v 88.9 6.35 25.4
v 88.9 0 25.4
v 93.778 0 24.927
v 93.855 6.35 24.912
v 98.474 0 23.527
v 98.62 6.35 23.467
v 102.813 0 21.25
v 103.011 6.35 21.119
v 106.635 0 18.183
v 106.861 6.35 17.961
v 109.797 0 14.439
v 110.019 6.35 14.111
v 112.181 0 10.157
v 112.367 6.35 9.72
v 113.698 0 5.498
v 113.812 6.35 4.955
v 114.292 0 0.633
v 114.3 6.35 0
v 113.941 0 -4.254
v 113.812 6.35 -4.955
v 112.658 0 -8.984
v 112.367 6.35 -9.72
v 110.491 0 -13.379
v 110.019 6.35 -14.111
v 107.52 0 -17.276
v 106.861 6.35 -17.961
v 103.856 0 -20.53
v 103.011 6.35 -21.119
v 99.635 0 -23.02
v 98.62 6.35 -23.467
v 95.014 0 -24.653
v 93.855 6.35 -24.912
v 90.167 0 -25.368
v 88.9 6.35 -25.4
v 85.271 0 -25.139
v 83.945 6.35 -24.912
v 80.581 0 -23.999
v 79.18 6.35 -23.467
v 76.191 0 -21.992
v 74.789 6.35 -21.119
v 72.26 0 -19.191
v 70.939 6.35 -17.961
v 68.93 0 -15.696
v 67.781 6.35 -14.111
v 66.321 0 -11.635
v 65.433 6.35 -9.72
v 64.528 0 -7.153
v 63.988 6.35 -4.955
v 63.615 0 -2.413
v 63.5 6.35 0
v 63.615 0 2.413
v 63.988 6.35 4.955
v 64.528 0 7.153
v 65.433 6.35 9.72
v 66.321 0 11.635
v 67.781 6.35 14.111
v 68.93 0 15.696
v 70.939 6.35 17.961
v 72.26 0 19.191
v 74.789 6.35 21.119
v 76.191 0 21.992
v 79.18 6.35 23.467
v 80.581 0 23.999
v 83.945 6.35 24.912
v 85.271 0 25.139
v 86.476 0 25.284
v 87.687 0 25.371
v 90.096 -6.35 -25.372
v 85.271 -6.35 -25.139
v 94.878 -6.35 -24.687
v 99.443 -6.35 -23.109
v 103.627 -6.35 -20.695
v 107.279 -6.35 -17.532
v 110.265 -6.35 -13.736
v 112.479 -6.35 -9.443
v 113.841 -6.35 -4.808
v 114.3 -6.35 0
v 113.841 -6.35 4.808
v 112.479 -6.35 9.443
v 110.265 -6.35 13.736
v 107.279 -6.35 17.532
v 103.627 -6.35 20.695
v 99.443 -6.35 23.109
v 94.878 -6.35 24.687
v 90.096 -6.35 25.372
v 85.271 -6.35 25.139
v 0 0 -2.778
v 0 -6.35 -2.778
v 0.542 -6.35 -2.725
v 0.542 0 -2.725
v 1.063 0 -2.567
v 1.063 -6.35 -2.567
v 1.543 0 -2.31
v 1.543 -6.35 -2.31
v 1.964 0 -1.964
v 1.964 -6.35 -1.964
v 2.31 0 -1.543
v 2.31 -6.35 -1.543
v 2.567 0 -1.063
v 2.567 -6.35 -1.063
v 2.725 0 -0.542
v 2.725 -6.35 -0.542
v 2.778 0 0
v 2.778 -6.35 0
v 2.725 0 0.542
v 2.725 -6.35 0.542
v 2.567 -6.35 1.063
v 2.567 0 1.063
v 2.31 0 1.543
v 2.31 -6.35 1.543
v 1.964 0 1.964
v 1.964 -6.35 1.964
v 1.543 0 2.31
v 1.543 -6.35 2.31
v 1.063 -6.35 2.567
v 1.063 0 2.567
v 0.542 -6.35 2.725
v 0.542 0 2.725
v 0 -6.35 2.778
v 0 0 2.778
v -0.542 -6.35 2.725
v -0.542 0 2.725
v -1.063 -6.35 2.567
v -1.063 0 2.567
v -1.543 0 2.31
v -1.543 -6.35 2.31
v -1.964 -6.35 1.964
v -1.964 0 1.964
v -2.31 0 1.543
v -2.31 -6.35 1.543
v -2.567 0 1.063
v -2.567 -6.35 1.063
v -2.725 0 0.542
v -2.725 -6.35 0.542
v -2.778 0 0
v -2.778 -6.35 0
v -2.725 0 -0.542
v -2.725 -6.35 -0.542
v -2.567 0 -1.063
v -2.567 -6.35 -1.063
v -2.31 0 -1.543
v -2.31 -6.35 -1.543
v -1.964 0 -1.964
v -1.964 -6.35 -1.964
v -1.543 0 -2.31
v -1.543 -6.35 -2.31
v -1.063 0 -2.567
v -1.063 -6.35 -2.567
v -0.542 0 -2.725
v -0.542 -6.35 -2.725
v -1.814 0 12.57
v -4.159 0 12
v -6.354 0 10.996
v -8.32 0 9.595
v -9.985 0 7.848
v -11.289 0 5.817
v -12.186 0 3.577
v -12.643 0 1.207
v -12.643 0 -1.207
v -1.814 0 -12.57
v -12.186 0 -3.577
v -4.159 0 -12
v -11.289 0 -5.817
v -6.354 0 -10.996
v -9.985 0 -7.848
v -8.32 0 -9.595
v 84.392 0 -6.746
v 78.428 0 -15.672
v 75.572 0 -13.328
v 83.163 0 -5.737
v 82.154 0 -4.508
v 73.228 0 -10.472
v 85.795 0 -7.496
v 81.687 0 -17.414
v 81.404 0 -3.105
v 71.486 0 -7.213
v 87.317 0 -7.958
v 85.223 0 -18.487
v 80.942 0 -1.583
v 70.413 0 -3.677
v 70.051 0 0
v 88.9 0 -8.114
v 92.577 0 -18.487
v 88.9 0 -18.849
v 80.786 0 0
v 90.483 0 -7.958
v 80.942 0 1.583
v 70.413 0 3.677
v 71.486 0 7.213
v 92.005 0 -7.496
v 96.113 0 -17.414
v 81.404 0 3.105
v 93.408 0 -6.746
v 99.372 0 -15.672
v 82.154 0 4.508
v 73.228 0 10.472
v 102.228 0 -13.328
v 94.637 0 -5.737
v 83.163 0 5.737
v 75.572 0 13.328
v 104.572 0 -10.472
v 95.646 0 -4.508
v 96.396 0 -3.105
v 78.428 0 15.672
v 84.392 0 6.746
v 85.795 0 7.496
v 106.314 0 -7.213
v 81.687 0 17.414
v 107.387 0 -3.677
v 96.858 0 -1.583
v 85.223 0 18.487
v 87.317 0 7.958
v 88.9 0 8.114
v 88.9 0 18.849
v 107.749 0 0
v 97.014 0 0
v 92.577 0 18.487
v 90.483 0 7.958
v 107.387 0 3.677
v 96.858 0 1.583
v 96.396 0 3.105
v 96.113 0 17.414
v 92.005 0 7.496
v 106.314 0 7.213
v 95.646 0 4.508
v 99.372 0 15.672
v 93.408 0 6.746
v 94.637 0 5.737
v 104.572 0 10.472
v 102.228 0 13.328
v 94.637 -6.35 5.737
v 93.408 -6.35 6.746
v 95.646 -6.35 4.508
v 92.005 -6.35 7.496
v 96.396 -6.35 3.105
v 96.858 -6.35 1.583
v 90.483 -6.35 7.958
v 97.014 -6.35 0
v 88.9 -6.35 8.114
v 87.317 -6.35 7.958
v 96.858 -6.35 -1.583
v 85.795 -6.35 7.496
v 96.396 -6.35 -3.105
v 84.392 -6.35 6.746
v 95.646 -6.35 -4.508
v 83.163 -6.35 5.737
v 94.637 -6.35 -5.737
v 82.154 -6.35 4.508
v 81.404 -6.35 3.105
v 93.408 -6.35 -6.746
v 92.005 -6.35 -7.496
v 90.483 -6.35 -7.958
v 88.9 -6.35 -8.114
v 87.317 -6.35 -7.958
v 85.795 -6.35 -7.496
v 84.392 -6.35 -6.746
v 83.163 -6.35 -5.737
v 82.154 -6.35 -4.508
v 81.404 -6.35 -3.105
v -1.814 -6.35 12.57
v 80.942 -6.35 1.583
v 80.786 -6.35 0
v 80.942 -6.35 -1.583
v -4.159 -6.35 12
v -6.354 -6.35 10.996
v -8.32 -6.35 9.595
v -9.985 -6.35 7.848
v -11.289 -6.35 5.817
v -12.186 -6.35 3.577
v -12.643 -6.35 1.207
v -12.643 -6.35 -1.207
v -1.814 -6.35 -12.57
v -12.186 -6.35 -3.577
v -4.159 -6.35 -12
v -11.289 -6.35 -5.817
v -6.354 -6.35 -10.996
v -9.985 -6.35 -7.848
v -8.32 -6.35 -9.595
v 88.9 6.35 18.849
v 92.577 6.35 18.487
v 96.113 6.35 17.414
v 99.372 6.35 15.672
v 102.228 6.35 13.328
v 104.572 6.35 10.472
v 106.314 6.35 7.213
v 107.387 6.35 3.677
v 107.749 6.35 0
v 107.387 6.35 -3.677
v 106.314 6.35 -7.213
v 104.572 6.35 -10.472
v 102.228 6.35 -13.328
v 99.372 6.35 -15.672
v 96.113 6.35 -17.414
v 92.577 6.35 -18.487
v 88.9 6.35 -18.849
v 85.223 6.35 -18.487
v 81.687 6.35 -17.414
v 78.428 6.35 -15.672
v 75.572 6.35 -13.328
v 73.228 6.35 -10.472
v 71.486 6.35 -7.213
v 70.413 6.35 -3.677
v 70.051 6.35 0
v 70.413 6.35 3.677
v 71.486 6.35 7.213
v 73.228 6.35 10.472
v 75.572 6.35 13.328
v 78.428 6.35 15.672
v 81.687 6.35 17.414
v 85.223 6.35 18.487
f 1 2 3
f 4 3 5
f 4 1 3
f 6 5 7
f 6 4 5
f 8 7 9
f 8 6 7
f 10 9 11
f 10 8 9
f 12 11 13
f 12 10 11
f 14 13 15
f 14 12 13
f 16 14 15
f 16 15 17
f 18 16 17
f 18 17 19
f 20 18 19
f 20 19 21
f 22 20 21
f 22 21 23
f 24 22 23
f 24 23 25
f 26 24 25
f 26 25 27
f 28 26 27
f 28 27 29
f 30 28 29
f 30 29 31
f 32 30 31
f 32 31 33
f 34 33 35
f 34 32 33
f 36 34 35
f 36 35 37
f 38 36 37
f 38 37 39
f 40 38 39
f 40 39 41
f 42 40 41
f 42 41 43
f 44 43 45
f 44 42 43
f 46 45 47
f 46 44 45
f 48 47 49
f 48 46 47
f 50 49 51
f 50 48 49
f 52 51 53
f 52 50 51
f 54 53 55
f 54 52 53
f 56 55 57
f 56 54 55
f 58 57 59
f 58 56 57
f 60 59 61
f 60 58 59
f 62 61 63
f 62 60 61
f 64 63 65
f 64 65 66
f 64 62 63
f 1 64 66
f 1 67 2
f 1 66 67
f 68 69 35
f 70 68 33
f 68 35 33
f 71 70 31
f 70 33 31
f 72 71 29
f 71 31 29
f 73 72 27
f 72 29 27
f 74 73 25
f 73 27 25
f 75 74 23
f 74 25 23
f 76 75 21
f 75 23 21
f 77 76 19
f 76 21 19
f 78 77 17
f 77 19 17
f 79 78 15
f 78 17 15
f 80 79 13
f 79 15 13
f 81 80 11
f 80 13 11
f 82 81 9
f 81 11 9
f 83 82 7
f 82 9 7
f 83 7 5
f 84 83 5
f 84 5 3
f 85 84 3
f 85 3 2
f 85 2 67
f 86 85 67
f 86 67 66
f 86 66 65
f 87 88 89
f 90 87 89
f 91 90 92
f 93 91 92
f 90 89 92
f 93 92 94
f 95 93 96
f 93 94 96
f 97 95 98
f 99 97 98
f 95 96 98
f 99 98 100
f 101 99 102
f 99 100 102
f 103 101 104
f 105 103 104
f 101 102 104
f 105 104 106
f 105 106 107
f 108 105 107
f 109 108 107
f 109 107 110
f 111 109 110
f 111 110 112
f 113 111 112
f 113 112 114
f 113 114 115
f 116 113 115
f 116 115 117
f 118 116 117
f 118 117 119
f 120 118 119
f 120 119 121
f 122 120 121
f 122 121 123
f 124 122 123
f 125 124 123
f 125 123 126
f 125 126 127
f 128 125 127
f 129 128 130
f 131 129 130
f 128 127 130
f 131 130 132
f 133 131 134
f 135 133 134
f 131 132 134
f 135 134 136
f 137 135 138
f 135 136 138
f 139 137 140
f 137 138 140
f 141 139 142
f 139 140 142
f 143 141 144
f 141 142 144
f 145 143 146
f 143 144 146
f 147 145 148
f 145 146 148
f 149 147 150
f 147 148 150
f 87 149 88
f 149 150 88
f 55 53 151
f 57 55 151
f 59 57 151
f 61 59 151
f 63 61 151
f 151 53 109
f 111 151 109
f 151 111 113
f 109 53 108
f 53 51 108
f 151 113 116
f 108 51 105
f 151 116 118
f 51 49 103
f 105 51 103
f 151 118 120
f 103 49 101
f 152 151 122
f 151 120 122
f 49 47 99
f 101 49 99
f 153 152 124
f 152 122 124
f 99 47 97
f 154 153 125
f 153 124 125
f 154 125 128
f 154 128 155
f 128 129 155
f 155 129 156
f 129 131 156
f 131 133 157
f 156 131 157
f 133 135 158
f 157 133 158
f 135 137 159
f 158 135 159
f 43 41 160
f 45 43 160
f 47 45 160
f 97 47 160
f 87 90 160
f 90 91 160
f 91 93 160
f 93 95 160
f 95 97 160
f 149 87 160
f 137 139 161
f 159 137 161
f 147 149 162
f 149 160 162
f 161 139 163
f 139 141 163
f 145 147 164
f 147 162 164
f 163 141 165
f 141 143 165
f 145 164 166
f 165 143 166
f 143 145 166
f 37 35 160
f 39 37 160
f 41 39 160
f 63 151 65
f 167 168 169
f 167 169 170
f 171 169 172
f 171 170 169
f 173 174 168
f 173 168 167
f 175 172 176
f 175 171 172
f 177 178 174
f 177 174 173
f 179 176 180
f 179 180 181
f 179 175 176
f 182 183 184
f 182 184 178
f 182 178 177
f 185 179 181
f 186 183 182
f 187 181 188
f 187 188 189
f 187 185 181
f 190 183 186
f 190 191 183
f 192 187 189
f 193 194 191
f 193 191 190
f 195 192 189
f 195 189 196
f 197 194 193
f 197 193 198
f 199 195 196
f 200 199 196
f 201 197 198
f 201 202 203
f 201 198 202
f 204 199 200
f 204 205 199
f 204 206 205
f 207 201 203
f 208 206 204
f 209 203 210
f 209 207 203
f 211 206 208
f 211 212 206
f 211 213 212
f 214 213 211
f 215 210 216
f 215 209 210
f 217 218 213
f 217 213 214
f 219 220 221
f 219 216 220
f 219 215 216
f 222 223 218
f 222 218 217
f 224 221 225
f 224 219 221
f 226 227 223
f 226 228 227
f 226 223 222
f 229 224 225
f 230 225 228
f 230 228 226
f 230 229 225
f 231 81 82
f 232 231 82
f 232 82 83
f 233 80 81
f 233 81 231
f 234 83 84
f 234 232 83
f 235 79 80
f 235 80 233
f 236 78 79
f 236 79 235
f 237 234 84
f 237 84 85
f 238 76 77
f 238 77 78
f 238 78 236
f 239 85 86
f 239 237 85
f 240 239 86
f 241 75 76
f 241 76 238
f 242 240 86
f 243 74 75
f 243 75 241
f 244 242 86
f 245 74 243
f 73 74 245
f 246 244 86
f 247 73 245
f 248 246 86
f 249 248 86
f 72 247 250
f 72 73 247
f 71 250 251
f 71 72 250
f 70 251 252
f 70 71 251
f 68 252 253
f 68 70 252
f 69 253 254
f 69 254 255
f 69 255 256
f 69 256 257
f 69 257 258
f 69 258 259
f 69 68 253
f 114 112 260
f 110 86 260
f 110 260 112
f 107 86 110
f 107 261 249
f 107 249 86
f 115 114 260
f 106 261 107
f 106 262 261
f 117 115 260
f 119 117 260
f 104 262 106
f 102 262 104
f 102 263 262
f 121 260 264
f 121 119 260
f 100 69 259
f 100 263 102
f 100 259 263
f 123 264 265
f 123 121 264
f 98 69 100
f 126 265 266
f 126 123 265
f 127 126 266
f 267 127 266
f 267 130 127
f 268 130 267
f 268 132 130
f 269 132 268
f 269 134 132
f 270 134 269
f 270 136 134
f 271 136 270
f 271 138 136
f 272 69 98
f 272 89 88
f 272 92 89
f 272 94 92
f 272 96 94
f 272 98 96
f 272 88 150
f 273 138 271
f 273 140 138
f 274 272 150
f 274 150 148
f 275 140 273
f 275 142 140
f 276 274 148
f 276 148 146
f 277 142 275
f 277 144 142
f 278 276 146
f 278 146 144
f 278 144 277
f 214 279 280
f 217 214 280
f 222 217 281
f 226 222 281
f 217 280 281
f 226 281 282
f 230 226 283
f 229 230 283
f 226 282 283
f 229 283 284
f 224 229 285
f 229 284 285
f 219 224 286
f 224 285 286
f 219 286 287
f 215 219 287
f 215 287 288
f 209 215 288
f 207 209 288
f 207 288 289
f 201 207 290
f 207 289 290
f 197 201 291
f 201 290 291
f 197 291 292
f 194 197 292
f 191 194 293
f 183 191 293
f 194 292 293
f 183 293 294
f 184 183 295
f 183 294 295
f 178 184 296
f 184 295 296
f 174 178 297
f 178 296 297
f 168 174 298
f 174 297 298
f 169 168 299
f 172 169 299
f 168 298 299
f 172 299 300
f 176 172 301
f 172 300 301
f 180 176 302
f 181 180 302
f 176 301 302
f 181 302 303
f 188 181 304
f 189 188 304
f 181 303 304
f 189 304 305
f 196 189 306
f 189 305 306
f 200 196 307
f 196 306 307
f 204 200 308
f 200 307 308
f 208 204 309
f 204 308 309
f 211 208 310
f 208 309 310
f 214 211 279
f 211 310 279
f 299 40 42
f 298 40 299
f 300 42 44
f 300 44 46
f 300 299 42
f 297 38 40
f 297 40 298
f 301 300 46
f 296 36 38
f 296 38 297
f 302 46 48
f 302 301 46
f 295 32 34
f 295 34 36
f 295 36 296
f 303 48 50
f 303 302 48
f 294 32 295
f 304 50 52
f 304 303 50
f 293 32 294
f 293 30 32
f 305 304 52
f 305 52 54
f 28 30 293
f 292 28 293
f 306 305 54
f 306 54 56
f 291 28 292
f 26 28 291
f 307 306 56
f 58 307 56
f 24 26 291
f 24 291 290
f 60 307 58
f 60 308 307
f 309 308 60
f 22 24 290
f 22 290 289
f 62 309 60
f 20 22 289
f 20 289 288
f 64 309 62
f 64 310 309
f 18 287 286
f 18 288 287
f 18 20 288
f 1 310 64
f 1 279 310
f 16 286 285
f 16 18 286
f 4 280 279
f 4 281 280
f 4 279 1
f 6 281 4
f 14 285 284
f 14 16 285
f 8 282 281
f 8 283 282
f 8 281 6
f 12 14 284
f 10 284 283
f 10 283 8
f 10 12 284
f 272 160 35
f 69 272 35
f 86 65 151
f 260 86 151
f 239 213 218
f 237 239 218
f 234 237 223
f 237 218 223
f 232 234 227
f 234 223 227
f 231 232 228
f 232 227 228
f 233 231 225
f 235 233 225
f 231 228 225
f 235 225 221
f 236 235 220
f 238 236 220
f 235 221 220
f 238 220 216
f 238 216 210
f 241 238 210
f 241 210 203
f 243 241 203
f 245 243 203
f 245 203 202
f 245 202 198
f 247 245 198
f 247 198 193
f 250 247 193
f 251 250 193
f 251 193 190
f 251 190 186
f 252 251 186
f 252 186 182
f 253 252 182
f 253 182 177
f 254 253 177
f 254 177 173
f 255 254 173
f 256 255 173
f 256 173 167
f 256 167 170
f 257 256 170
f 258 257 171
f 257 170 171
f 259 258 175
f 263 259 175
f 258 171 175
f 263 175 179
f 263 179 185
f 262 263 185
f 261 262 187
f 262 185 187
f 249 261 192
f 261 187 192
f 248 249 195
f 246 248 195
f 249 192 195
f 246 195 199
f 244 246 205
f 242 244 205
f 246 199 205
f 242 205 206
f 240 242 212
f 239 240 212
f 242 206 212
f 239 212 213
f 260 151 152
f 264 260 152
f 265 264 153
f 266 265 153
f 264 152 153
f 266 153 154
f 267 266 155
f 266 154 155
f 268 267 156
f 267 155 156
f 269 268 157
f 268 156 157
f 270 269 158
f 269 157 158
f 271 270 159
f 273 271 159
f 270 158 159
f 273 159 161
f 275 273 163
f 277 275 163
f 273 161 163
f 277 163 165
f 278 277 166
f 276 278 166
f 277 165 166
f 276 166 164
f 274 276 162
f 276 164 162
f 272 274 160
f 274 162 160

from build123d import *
from build123d.topology import SkipClean

# Parameters (mm, degrees)
EXTRUDE1_DEPTH                      = 6.35
EXTRUDE2_START                      = 6.35
SKETCH2_R                           = 25.4
EXTRUDE2_DEPTH                      = 6.35
F_7_32_0_21875_DIAMETER_HOLE1_D     = 5.55625
F_7_32_0_21875_DIAMETER_HOLE1_DEPTH = 25.4
F_7_32_0_21875_DIAMETER_HOLE1_TIP   = 1.669265907
SKETCH5_R                           = 18.848677946
EXTRUDE3_DEPTH                      = 6.35
SKETCH6_R                           = 8.113502116
EXTRUDE5_DEPTH                      = 118.260276735


with BuildPart() as part:
    # Sketch1 → Extrude1 (new body)
    with BuildSketch(Plane(origin=(0, 0, 0), x_dir=(1, 0, 0), z_dir=(0, 1, 0))):
        with BuildLine():
            Line((-1.814285714, 12.569740146), (85.271428571, 25.139480293))
            ThreePointArc((85.271428571, 25.139480293), (114.3, 0), (85.271428571, -25.139480293))
            Line((85.271428571, -25.139480293), (-1.814285714, -12.569740146))
            ThreePointArc((-1.814285714, -12.569740146), (-12.7, 0), (-1.814285714, 12.569740146))
        make_face()
    extrude(amount=-EXTRUDE1_DEPTH)

    # Sketch2 → Extrude2 (add)
    with SkipClean():  # the faces are left unmerged after this step: merging them gives an invalid solid
        with BuildSketch(Plane(origin=(0, 0, 0), x_dir=(1, 0, 0), z_dir=(0, 1, 0)).offset(EXTRUDE2_START)):
            with Locations(Location((88.9, 0, 0), (0, 0, 270))):
                Circle(SKETCH2_R)
        extrude(amount=-EXTRUDE2_DEPTH)

    # 7/32 (0.21875) Diameter Hole1
    with Locations(Plane.ZX):
        with Locations((0, 0)):
            Hole(F_7_32_0_21875_DIAMETER_HOLE1_D / 2, depth=F_7_32_0_21875_DIAMETER_HOLE1_DEPTH)
            with Locations((0, 0, -(F_7_32_0_21875_DIAMETER_HOLE1_DEPTH + F_7_32_0_21875_DIAMETER_HOLE1_TIP / 2))):  # 118° drill point
                Cone(0, F_7_32_0_21875_DIAMETER_HOLE1_D / 2, F_7_32_0_21875_DIAMETER_HOLE1_TIP, mode=Mode.SUBTRACT)

    # Sketch5 → Extrude3 (cut)
    with SkipClean():  # the faces are left unmerged after this step: merging them gives an invalid solid
        with BuildSketch(Plane(origin=(0, 6.35, 0), x_dir=(-1, 0, 0), z_dir=(0, 1, 0))):
            with Locations(Location((-88.9, 0, 0), (0, 0, 90))):
                Circle(SKETCH5_R)
        extrude(amount=-EXTRUDE3_DEPTH, mode=Mode.SUBTRACT)

    # Sketch6 → Extrude5 (cut, through all)
    with SkipClean():  # the faces are left unmerged after this step: merging them gives an invalid solid
        with BuildSketch(Plane(origin=(0, 0, 0), x_dir=(-1, 0, 0), z_dir=(0, 1, 0))):
            with Locations(Location((-88.9, 0, 0), (0, 0, 90))):
                Circle(SKETCH6_R)
        extrude(amount=-EXTRUDE5_DEPTH, mode=Mode.SUBTRACT)


solid = part.part
